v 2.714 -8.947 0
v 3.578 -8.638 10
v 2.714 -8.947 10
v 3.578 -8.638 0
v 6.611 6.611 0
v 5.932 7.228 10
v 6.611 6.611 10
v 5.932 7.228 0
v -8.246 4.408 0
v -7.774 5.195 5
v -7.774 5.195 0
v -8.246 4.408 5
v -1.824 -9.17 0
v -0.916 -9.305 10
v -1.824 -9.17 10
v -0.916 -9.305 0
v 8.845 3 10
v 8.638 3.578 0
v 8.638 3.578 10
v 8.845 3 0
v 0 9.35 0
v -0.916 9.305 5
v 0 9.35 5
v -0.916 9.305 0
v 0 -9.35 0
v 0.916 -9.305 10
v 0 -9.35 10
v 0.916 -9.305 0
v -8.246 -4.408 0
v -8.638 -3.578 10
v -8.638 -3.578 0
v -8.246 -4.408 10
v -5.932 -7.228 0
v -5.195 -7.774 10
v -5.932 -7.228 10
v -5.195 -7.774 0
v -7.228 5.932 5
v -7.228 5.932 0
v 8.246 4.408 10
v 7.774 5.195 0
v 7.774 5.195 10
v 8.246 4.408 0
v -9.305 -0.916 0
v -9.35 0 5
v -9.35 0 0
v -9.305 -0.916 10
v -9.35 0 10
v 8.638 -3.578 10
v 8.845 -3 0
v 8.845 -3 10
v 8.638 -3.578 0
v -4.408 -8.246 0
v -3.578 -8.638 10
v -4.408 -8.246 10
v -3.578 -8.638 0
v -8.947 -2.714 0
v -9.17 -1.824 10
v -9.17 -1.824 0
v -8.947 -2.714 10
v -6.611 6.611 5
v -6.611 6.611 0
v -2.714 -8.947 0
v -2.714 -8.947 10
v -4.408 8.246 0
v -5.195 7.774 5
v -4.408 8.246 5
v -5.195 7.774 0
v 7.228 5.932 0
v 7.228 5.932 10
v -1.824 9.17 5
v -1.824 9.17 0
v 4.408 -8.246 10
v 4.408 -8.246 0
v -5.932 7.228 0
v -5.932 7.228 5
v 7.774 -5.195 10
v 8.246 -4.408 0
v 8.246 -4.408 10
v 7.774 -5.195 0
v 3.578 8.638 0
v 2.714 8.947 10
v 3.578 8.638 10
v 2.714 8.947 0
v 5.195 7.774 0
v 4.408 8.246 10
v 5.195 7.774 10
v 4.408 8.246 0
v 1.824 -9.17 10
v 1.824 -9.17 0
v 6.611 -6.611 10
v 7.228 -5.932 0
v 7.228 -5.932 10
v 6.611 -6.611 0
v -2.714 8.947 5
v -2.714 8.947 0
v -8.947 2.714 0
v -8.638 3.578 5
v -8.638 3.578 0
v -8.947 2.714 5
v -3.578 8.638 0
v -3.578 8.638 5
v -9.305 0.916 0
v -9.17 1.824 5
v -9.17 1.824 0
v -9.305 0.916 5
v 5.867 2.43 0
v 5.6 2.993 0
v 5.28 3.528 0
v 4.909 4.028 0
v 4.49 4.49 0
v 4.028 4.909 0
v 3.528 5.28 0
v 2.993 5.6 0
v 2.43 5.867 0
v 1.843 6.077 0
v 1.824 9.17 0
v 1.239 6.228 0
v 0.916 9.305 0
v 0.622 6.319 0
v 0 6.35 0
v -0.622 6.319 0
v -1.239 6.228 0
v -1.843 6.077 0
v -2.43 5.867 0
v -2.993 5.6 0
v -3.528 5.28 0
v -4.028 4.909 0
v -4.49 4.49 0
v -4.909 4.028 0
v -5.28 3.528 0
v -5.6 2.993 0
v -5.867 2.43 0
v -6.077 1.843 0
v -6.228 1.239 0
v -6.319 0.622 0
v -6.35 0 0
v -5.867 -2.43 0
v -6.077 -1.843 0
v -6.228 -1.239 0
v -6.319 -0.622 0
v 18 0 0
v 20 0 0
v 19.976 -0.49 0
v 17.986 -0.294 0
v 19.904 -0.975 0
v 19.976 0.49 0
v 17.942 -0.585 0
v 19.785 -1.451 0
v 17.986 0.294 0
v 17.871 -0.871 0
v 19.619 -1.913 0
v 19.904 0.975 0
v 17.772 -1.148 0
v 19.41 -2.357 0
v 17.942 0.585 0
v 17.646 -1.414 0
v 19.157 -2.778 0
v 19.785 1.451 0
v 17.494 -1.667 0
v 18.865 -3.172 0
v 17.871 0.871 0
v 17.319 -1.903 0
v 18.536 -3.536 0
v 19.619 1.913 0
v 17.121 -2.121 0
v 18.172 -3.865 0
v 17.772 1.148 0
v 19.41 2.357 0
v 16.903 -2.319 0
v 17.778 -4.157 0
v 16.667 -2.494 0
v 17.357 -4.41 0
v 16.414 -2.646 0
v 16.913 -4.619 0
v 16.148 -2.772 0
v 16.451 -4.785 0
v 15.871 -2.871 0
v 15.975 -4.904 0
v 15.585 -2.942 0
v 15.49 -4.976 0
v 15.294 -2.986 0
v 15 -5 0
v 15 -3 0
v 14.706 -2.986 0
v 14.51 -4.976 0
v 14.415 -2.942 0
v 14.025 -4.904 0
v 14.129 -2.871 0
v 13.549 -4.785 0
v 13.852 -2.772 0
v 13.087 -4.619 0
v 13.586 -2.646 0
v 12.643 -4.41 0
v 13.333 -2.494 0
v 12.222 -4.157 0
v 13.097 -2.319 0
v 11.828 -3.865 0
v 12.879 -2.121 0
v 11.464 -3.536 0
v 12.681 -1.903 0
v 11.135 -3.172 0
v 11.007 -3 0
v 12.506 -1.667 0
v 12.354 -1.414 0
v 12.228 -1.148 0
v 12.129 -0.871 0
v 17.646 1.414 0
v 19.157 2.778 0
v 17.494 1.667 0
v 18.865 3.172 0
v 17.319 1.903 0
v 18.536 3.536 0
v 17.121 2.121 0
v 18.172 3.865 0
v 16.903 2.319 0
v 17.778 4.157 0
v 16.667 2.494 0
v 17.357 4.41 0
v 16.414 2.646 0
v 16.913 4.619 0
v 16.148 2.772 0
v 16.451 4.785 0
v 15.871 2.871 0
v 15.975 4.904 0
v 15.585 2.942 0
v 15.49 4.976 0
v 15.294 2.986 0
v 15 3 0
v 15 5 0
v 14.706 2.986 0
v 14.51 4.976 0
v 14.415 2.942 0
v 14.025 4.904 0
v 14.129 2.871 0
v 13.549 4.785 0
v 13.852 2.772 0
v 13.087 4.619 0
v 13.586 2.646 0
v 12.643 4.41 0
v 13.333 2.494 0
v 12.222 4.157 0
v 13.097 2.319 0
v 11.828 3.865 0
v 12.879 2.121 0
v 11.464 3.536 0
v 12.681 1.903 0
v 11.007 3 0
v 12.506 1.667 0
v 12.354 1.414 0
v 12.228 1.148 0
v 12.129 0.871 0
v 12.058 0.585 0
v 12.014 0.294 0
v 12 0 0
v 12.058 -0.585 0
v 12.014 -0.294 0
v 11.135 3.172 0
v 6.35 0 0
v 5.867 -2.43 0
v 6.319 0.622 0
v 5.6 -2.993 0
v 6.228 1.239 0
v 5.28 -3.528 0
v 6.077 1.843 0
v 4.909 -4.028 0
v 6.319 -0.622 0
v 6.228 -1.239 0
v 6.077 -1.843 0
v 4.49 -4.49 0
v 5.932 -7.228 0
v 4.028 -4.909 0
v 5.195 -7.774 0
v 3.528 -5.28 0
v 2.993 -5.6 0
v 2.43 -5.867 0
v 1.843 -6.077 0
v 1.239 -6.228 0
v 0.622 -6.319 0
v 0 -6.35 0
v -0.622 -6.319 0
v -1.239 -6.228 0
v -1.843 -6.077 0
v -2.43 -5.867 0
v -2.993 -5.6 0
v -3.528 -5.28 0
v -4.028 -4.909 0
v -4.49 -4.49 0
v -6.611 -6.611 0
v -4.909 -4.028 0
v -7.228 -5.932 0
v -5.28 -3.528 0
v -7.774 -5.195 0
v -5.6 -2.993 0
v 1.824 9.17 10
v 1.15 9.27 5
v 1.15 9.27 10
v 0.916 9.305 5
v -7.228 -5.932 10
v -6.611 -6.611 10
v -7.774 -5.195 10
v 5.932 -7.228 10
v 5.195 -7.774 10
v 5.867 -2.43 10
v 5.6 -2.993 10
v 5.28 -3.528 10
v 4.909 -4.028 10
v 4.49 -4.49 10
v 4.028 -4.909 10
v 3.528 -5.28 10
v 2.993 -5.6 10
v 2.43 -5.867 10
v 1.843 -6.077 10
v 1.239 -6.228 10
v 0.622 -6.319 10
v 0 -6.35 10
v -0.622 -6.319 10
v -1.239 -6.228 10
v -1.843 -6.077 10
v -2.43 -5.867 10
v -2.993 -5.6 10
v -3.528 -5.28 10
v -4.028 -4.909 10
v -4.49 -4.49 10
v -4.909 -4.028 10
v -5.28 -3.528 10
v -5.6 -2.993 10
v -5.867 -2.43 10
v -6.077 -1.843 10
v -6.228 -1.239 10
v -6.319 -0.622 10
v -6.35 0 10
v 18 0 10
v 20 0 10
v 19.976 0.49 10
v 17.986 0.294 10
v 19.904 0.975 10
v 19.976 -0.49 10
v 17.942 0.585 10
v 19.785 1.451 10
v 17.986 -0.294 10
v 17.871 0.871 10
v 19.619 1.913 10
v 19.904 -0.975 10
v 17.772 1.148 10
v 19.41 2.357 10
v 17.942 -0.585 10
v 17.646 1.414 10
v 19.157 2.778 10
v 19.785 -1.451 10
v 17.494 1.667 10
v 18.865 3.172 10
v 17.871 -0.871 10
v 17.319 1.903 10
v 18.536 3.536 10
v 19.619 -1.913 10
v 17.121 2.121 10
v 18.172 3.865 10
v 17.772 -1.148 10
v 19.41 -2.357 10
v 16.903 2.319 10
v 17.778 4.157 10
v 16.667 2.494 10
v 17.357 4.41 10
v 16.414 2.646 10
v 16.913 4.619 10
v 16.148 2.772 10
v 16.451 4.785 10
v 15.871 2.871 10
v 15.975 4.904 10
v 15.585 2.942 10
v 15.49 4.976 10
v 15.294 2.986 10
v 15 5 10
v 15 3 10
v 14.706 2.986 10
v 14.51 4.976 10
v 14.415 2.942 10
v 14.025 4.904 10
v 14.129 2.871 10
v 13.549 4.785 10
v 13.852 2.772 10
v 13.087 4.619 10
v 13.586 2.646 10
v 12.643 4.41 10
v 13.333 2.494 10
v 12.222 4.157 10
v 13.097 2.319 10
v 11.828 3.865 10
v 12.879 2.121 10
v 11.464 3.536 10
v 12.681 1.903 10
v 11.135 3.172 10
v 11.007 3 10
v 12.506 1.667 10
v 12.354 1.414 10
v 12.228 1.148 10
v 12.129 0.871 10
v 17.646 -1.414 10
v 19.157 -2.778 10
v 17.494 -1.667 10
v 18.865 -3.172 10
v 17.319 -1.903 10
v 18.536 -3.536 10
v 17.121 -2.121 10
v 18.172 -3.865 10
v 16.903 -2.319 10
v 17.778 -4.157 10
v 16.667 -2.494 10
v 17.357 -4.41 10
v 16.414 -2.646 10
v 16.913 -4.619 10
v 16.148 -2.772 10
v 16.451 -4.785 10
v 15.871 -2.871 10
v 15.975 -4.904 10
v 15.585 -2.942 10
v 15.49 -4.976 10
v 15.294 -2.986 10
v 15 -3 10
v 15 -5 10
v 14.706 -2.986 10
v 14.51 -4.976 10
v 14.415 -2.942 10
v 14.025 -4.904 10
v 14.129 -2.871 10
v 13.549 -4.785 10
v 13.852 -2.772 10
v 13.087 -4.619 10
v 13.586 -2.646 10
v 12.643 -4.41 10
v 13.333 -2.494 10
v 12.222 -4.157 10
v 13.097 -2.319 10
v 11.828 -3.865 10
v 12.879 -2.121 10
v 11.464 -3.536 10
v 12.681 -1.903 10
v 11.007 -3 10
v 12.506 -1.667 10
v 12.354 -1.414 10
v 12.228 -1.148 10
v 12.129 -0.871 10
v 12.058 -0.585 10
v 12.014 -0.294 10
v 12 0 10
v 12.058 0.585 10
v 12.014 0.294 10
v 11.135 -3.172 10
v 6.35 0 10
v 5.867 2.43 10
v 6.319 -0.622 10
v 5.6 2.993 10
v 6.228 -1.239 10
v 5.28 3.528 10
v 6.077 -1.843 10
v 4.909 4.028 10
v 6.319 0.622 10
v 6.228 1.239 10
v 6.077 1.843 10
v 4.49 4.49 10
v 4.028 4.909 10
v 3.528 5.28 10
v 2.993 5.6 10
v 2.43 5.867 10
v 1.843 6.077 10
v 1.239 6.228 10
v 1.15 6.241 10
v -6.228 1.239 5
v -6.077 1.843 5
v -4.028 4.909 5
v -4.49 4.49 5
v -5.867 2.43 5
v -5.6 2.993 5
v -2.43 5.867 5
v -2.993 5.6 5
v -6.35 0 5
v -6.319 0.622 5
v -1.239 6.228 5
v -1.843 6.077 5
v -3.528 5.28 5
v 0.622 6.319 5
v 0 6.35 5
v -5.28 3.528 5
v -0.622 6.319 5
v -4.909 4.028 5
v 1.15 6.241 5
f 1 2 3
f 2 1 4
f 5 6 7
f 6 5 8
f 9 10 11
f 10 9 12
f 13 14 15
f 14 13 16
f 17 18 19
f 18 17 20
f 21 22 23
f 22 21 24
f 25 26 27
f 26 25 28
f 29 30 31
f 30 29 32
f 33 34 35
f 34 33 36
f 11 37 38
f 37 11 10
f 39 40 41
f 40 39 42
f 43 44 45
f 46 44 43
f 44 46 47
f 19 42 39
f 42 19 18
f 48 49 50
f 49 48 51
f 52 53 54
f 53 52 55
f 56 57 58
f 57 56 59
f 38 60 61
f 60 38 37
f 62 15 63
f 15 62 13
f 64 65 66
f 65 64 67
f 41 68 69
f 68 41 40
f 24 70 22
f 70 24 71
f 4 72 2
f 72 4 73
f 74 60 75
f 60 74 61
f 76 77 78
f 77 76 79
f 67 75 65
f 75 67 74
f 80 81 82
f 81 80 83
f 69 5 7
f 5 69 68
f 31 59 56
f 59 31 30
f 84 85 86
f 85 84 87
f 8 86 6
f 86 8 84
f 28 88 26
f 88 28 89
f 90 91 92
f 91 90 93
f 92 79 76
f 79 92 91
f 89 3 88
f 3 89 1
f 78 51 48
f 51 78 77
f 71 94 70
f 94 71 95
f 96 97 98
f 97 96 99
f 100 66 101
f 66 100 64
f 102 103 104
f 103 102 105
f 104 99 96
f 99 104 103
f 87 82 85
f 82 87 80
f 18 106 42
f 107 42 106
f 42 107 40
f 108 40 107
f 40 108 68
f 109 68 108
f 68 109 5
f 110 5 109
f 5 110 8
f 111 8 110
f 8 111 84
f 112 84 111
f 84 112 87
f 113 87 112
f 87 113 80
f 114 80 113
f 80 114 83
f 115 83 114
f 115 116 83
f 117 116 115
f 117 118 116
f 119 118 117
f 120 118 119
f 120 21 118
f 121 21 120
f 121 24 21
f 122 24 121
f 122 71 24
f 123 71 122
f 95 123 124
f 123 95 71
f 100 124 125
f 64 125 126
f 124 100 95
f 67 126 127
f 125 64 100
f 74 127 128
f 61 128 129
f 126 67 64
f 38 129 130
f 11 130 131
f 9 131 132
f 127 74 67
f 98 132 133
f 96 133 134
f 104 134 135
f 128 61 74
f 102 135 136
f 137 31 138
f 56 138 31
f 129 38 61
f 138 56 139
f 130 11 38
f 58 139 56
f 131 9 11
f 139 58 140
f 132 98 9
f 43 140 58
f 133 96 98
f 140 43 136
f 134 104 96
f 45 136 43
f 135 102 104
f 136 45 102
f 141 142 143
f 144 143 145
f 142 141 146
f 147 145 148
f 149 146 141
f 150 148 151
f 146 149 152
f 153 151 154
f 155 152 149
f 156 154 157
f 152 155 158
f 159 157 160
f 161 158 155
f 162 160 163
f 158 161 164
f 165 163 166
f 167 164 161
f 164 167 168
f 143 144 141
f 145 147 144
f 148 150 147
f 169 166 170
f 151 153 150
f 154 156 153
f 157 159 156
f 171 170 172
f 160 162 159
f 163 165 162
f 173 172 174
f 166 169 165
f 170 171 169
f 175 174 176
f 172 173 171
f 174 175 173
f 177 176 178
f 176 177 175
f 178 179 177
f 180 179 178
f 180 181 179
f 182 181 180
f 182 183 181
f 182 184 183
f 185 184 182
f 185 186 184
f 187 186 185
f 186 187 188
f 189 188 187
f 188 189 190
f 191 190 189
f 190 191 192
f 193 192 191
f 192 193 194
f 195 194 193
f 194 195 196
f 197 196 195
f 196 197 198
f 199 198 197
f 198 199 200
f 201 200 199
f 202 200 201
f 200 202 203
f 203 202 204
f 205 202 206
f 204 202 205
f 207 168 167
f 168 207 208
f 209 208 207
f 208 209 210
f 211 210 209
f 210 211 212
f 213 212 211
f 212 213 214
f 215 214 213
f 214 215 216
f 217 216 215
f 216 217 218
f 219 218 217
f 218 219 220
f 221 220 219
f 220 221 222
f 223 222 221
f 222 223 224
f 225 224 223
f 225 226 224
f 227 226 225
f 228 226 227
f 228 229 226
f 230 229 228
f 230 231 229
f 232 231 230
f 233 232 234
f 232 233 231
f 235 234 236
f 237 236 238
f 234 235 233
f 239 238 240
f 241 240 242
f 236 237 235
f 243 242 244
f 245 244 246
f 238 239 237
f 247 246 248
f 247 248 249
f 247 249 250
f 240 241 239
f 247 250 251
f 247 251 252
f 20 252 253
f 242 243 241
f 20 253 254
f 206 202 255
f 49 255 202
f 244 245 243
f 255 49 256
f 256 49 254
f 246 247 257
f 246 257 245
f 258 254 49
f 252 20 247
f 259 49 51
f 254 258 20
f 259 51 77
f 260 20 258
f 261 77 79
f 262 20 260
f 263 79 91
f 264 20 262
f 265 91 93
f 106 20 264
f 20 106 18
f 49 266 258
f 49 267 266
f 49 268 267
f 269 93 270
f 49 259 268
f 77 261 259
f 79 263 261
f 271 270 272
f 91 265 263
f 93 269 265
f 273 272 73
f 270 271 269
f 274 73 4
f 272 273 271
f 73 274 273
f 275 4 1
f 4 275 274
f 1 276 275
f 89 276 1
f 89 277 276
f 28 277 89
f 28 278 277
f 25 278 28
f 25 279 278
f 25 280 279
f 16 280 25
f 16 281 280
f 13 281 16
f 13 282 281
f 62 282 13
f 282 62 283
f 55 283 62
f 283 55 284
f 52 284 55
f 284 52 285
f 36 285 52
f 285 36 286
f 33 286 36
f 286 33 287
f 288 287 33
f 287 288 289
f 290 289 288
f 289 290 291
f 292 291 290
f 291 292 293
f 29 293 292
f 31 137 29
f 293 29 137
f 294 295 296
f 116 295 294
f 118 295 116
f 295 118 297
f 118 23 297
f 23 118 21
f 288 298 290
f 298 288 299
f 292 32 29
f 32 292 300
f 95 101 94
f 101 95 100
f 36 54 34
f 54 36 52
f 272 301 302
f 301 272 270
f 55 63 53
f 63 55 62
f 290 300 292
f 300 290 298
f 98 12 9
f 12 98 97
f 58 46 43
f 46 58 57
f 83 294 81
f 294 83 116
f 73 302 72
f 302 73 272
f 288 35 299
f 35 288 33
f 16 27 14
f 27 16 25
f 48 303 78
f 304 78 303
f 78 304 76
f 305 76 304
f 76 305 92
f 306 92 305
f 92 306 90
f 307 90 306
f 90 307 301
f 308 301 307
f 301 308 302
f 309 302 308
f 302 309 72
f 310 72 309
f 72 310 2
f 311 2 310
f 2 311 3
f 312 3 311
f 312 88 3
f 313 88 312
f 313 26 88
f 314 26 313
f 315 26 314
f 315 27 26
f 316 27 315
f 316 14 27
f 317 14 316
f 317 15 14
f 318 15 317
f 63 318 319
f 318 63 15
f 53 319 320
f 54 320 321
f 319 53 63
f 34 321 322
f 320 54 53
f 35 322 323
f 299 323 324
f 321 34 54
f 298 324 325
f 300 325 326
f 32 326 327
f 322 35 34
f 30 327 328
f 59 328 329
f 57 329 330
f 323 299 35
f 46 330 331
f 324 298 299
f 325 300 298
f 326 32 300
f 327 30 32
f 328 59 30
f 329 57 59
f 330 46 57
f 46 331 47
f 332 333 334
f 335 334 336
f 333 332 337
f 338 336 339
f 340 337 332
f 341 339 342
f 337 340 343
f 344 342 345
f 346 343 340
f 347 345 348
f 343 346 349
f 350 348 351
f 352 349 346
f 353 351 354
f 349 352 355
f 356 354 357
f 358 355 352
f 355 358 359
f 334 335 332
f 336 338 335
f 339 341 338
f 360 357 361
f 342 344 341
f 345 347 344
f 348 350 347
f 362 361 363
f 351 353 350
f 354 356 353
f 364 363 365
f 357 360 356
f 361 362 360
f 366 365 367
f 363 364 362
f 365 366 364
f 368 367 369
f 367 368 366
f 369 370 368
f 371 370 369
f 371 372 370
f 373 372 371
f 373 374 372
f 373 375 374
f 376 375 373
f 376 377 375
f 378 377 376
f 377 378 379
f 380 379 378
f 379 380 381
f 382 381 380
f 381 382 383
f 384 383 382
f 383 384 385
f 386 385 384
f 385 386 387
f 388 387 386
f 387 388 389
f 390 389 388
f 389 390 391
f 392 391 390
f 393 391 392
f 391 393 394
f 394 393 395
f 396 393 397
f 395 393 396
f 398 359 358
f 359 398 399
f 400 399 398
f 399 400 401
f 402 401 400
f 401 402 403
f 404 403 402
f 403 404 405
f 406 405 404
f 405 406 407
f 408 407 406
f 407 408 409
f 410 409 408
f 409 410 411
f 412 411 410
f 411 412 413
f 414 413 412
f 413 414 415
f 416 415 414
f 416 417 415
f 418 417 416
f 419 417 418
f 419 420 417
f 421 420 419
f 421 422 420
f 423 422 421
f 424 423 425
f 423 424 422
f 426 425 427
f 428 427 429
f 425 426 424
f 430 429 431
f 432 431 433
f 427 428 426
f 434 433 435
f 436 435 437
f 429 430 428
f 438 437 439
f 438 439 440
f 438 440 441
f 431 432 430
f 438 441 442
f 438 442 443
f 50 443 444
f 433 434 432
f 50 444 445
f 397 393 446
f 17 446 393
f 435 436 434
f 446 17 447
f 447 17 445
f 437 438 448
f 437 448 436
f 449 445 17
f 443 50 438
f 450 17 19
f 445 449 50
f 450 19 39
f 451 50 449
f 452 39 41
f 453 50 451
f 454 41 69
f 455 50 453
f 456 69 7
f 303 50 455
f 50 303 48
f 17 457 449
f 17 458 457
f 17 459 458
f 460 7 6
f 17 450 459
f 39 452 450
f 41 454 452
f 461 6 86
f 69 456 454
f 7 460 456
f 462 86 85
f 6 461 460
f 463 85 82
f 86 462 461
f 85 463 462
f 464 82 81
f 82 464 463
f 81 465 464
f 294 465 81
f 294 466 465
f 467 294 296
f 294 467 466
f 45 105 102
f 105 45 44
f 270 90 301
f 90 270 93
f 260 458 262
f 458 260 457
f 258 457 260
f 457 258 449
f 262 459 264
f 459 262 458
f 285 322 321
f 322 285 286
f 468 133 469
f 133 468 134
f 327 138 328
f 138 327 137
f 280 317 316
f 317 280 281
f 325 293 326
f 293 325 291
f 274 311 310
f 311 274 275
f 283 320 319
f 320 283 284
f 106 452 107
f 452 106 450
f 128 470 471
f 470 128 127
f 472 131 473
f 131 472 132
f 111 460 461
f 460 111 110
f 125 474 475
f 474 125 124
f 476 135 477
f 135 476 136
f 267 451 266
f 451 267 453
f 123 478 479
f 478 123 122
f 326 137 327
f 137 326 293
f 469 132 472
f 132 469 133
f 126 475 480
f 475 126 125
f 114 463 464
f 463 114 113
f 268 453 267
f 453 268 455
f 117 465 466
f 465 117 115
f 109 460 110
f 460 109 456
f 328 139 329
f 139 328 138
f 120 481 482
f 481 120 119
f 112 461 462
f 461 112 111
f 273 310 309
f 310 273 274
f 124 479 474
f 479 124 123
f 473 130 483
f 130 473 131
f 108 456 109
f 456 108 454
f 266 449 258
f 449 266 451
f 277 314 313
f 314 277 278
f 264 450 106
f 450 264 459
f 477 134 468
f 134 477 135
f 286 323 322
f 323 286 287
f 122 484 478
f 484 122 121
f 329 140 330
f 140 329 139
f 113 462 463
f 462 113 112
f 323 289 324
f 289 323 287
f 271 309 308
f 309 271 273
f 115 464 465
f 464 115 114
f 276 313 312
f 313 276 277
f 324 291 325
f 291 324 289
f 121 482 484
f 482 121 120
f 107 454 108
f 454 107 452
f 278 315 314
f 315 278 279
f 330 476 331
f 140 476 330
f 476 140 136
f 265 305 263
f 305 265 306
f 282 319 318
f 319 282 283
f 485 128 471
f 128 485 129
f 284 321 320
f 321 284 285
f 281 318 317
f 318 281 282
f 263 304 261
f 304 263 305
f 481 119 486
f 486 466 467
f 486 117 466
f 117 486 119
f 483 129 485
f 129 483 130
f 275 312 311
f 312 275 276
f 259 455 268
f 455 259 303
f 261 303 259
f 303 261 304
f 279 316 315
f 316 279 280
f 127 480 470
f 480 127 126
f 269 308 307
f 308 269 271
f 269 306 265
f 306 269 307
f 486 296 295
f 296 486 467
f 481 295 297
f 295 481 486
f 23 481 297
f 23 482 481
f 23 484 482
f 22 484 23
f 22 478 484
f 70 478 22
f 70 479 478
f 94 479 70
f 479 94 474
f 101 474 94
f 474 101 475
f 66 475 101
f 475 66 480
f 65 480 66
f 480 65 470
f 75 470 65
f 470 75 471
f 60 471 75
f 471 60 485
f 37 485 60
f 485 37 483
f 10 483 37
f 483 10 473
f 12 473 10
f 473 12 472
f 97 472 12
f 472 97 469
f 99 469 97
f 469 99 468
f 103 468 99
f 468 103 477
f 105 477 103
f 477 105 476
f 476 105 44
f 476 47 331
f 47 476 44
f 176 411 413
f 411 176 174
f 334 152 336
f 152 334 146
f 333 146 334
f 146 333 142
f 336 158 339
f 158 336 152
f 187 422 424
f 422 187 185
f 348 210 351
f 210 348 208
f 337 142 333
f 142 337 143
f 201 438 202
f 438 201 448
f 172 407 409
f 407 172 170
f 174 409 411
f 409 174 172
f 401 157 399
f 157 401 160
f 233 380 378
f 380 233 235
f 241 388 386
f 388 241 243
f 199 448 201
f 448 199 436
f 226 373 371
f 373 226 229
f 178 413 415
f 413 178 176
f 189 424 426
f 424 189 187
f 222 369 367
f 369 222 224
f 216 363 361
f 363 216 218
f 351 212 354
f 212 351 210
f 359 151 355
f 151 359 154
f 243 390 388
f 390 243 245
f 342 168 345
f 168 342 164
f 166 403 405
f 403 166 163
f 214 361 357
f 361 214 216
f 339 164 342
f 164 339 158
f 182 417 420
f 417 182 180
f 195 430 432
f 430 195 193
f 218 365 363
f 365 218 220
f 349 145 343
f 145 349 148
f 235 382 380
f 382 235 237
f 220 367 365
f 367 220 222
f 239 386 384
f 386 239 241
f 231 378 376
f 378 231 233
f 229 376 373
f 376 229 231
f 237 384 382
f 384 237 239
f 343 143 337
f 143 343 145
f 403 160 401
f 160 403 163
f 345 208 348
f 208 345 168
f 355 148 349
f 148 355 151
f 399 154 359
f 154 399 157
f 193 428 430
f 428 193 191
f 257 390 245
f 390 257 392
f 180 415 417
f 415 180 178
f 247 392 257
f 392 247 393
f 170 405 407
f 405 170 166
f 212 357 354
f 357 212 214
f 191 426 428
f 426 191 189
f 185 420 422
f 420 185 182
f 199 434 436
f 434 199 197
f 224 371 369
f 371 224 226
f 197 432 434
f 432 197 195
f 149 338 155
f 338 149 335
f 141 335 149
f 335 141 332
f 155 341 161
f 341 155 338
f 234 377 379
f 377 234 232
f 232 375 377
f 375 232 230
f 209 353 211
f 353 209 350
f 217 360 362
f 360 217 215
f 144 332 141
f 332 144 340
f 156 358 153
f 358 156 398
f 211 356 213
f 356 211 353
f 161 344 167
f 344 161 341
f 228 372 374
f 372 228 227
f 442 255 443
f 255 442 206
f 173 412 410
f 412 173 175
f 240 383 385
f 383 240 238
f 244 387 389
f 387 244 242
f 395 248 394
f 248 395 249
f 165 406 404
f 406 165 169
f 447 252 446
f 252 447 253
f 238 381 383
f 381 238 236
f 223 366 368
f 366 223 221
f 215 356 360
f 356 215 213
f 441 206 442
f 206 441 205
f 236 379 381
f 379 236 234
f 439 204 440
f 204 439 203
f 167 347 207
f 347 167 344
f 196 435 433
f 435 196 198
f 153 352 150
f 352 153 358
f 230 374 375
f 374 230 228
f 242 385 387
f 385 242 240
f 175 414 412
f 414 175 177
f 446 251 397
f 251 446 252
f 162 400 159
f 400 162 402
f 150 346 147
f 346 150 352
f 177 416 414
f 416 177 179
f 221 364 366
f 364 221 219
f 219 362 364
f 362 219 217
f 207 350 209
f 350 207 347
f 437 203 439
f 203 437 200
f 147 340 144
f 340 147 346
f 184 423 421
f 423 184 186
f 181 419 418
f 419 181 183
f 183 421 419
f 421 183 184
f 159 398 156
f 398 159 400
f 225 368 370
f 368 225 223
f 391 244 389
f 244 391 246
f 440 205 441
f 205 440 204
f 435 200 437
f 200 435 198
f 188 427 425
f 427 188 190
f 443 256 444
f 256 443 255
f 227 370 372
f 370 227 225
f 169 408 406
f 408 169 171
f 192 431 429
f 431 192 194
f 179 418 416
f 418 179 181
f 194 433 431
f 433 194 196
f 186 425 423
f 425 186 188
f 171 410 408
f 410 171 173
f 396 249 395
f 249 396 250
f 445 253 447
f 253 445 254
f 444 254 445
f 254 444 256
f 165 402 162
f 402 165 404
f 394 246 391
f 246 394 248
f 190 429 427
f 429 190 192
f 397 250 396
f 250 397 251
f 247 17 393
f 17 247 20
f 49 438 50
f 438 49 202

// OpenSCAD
// Snap-on Clip for Lab Stand Rod and Tubing (Corrected)
// Orientation: Flat on XY plane, building up in +Z.
// Units: Millimetres.

// --- Dimensions ---
// Rod Stand Dimensions
$rod_diameter = 12.7;
$rod_wall_thickness = 3;
$rod_outer_diameter = $rod_diameter + 2 * $rod_wall_thickness; // 18.7
$rod_center = [0, 0];

// Tubing Dimensions
$tubing_diameter = 6;
$tubing_wall_thickness = 2;
$tubing_outer_diameter = $tubing_diameter + 2 * $tubing_wall_thickness; // 10
$tubing_center = [15, 0];

// Clip Geometry
$clip_height = 10;
$bridge_width_x = 4; // Distance between x=8 and x=12
$bridge_width_y = 6;
$opening_width_rod = 10;
$opening_width_tubing = 4.5;

// Extrusion settings
$fn = 64;

module rod_ring() {
    // Rod ring: 12.7mm ID, 3mm wall, centred at origin.
    // Opening cut: x < 0 and -5 < y < 5.
    
    difference() {
        // 1. Create the full outer ring (OD = 18.7)
        translate($rod_center)
        cylinder(h = $clip_height, d = $rod_outer_diameter, $fn = $fn);
        
        // 2. Cut the inner hole (ID = 12.7)
        // This creates the ring shape.
        translate($rod_center)
        cylinder(h = $clip_height, d = $rod_diameter, $fn = $fn);
        
        // 3. Cut the opening on the -X side
        // Opening is 10mm wide, centred at y=0, so y goes from -5 to 5.
        // We cut a rectangle that extends slightly past the ring face to ensure clean cut.
        // The cut must go through the entire thickness of the ring wall.
        translate([-($rod_outer_diameter/2) - 0.5, 0, $clip_height/2])
        cube([
            $opening_width_rod + 1, // Width + clearance
            $opening_width_rod,     // Height (y)
            $clip_height + 0.5      // Depth (z)
        ]);
    }
}

module tubing_ring() {
    // Tubing ring: 6mm ID, 2mm wall, centred at x=15, y=0.
    // Opening cut: x > 15 and -2.25 < y < 2.25.
    
    difference() {
        // 1. Create the full outer ring (OD = 10)
        translate($tubing_center)
        cylinder(h = $clip_height, d = $tubing_outer_diameter, $fn = $fn);
        
        // 2. Cut the inner hole (ID = 6)
        translate($tubing_center)
        cylinder(h = $clip_height, d = $tubing_diameter, $fn = $fn);
        
        // 3. Cut the opening on the +X side
        // Opening is 4.5mm wide, centred at y=0, so y goes from -2.25 to 2.25.
        // Cut rectangle extends past the ring face.
        translate([$tubing_outer_diameter/2 + 0.5, 0, $clip_height/2])
        cube([
            $opening_width_tubing + 1, // Width + clearance
            $opening_width_tubing,     // Height (y)
            $clip_height + 0.5         // Depth (z)
        ]);
    }
}

module bridge() {
    // Solid bridge: 6mm wide (Y), joining x=8 to x=12.
    // Height matches clip height.
    // Position: x from 8 to 12.
    
    translate([8, -($bridge_width_y/2), 0])
    cube([
        $bridge_width_x, // x length (12-8)
        $bridge_width_y, // y width (6)
        $clip_height     // z height
    ]);
}

// --- Main Assembly ---
difference() {
    union() {
        rod_ring();
        tubing_ring();
        bridge();
    }
    
    // No additional cuts needed as the rings and bridge are the final solid parts.
}
